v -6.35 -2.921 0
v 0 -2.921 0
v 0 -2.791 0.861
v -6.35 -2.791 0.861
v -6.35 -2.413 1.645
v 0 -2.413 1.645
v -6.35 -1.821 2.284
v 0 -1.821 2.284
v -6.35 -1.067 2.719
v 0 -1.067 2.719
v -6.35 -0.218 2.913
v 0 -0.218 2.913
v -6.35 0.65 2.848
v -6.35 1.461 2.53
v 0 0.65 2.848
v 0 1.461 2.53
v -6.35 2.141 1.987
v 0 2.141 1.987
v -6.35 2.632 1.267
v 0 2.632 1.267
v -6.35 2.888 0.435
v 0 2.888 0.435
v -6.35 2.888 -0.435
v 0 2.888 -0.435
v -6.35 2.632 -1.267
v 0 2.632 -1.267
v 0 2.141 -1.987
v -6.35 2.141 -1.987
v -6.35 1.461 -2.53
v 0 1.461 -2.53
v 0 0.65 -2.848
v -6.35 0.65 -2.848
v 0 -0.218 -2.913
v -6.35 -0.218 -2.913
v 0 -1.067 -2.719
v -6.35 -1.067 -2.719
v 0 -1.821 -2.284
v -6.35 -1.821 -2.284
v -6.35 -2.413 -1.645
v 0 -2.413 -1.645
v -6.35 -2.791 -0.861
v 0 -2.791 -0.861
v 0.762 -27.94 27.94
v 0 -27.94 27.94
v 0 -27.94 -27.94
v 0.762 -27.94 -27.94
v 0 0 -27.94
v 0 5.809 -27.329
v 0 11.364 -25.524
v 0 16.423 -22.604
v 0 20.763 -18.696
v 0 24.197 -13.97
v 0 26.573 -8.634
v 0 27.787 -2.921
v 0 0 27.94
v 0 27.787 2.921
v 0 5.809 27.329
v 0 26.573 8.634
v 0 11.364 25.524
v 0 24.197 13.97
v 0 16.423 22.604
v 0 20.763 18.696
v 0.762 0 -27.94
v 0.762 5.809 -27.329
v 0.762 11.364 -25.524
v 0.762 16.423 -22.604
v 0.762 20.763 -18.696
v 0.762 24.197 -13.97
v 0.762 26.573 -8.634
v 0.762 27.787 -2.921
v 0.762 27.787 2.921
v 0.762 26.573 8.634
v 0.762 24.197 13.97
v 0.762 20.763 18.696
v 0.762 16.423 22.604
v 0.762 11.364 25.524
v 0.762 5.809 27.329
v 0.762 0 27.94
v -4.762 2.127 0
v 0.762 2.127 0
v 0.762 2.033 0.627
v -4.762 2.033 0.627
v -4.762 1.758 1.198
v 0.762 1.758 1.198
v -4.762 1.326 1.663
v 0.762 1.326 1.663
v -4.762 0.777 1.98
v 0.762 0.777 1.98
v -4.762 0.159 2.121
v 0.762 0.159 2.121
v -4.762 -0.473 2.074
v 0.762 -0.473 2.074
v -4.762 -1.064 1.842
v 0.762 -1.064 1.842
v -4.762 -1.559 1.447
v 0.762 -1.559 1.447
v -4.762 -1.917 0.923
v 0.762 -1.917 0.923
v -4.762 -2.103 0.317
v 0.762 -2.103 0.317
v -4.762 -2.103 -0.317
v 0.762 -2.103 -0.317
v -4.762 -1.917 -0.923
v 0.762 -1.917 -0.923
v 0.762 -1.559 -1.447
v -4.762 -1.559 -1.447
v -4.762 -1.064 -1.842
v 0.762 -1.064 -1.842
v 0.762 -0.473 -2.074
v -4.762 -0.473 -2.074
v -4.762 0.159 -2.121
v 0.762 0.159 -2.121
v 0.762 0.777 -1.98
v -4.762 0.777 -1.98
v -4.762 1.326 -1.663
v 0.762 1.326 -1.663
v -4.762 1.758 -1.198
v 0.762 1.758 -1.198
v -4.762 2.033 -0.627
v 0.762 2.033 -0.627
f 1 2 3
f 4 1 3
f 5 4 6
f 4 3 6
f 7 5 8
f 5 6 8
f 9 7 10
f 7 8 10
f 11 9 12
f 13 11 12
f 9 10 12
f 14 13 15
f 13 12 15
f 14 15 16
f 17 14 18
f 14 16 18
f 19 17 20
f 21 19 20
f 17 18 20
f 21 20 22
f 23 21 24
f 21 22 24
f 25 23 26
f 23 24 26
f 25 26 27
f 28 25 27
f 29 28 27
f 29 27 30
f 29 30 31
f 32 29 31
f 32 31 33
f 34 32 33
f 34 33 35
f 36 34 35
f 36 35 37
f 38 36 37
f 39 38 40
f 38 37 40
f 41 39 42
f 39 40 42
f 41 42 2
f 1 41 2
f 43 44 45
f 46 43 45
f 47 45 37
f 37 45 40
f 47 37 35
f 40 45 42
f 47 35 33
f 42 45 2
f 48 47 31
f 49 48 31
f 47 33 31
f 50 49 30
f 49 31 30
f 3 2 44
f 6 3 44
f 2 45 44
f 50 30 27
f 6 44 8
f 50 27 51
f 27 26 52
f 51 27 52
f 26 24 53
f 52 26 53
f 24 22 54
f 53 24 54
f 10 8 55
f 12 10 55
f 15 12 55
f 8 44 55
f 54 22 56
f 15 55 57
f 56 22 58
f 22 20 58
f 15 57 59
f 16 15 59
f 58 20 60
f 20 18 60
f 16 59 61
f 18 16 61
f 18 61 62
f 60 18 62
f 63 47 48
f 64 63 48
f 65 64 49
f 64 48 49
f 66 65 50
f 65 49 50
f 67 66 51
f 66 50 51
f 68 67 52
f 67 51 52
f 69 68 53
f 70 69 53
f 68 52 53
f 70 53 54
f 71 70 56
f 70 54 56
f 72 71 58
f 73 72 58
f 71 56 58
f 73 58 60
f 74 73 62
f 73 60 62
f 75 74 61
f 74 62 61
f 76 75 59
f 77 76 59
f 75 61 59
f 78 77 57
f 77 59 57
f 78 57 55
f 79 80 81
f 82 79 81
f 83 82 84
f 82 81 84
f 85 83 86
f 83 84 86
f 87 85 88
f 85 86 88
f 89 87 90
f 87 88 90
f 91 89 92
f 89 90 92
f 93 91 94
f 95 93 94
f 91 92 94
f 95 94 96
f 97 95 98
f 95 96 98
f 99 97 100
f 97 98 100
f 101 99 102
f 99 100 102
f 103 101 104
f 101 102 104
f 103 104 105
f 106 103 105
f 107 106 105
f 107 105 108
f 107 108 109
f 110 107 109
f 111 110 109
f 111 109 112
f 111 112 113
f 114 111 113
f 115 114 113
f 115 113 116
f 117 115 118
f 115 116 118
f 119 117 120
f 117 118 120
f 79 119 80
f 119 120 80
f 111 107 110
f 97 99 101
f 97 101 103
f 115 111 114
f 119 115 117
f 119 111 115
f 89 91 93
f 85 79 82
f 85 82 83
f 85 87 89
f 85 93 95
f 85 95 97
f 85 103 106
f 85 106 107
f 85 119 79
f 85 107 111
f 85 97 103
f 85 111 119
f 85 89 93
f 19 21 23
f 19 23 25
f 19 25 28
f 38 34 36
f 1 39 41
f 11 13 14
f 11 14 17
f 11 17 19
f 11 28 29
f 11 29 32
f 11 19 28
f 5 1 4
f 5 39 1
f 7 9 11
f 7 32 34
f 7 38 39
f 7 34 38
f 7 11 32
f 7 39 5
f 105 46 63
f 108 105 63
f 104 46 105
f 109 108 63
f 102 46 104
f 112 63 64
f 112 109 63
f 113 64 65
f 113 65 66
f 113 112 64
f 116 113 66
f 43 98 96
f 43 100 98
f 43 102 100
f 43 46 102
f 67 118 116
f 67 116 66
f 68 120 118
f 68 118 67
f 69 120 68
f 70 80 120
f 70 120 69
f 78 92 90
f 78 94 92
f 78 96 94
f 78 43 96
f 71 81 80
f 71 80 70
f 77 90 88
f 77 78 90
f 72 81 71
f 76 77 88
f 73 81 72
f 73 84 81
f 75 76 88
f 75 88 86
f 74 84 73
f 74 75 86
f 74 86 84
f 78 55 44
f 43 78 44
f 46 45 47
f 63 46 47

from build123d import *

# Parameters (mm, degrees)
F1_DEPTH = 0.762
F2_R     = 2.921
F3_DEPTH = 6.35
F4_R     = 2.12725
F5_DEPTH = 5.5245


with BuildPart() as f1:
    # F0 (on Right) → F1 (new body)
    with BuildSketch(Plane.YZ):
        with BuildLine():
            Line((-27.94, -27.94), (0, -27.94))
            ThreePointArc((0, -27.94), (27.94, 0), (0, 27.94))
            Line((0, 27.94), (-27.94, 27.94))
            Line((-27.94, 27.94), (-27.94, -27.94))
        make_face()
    extrude(amount=F1_DEPTH)

    # F2 (on face) → F3 (join)
    with BuildSketch(Plane(origin=(0, 0, 0), x_dir=(0, -1, 0), z_dir=(-1, 0, 0))):
        Circle(F2_R)
    extrude(amount=F3_DEPTH)

    # F4 (on face) → F5 (cut)
    with BuildSketch(Plane.YZ.offset(0.762)):
        Circle(F4_R)
    extrude(amount=-F5_DEPTH, mode=Mode.SUBTRACT)


solid = f1.part
